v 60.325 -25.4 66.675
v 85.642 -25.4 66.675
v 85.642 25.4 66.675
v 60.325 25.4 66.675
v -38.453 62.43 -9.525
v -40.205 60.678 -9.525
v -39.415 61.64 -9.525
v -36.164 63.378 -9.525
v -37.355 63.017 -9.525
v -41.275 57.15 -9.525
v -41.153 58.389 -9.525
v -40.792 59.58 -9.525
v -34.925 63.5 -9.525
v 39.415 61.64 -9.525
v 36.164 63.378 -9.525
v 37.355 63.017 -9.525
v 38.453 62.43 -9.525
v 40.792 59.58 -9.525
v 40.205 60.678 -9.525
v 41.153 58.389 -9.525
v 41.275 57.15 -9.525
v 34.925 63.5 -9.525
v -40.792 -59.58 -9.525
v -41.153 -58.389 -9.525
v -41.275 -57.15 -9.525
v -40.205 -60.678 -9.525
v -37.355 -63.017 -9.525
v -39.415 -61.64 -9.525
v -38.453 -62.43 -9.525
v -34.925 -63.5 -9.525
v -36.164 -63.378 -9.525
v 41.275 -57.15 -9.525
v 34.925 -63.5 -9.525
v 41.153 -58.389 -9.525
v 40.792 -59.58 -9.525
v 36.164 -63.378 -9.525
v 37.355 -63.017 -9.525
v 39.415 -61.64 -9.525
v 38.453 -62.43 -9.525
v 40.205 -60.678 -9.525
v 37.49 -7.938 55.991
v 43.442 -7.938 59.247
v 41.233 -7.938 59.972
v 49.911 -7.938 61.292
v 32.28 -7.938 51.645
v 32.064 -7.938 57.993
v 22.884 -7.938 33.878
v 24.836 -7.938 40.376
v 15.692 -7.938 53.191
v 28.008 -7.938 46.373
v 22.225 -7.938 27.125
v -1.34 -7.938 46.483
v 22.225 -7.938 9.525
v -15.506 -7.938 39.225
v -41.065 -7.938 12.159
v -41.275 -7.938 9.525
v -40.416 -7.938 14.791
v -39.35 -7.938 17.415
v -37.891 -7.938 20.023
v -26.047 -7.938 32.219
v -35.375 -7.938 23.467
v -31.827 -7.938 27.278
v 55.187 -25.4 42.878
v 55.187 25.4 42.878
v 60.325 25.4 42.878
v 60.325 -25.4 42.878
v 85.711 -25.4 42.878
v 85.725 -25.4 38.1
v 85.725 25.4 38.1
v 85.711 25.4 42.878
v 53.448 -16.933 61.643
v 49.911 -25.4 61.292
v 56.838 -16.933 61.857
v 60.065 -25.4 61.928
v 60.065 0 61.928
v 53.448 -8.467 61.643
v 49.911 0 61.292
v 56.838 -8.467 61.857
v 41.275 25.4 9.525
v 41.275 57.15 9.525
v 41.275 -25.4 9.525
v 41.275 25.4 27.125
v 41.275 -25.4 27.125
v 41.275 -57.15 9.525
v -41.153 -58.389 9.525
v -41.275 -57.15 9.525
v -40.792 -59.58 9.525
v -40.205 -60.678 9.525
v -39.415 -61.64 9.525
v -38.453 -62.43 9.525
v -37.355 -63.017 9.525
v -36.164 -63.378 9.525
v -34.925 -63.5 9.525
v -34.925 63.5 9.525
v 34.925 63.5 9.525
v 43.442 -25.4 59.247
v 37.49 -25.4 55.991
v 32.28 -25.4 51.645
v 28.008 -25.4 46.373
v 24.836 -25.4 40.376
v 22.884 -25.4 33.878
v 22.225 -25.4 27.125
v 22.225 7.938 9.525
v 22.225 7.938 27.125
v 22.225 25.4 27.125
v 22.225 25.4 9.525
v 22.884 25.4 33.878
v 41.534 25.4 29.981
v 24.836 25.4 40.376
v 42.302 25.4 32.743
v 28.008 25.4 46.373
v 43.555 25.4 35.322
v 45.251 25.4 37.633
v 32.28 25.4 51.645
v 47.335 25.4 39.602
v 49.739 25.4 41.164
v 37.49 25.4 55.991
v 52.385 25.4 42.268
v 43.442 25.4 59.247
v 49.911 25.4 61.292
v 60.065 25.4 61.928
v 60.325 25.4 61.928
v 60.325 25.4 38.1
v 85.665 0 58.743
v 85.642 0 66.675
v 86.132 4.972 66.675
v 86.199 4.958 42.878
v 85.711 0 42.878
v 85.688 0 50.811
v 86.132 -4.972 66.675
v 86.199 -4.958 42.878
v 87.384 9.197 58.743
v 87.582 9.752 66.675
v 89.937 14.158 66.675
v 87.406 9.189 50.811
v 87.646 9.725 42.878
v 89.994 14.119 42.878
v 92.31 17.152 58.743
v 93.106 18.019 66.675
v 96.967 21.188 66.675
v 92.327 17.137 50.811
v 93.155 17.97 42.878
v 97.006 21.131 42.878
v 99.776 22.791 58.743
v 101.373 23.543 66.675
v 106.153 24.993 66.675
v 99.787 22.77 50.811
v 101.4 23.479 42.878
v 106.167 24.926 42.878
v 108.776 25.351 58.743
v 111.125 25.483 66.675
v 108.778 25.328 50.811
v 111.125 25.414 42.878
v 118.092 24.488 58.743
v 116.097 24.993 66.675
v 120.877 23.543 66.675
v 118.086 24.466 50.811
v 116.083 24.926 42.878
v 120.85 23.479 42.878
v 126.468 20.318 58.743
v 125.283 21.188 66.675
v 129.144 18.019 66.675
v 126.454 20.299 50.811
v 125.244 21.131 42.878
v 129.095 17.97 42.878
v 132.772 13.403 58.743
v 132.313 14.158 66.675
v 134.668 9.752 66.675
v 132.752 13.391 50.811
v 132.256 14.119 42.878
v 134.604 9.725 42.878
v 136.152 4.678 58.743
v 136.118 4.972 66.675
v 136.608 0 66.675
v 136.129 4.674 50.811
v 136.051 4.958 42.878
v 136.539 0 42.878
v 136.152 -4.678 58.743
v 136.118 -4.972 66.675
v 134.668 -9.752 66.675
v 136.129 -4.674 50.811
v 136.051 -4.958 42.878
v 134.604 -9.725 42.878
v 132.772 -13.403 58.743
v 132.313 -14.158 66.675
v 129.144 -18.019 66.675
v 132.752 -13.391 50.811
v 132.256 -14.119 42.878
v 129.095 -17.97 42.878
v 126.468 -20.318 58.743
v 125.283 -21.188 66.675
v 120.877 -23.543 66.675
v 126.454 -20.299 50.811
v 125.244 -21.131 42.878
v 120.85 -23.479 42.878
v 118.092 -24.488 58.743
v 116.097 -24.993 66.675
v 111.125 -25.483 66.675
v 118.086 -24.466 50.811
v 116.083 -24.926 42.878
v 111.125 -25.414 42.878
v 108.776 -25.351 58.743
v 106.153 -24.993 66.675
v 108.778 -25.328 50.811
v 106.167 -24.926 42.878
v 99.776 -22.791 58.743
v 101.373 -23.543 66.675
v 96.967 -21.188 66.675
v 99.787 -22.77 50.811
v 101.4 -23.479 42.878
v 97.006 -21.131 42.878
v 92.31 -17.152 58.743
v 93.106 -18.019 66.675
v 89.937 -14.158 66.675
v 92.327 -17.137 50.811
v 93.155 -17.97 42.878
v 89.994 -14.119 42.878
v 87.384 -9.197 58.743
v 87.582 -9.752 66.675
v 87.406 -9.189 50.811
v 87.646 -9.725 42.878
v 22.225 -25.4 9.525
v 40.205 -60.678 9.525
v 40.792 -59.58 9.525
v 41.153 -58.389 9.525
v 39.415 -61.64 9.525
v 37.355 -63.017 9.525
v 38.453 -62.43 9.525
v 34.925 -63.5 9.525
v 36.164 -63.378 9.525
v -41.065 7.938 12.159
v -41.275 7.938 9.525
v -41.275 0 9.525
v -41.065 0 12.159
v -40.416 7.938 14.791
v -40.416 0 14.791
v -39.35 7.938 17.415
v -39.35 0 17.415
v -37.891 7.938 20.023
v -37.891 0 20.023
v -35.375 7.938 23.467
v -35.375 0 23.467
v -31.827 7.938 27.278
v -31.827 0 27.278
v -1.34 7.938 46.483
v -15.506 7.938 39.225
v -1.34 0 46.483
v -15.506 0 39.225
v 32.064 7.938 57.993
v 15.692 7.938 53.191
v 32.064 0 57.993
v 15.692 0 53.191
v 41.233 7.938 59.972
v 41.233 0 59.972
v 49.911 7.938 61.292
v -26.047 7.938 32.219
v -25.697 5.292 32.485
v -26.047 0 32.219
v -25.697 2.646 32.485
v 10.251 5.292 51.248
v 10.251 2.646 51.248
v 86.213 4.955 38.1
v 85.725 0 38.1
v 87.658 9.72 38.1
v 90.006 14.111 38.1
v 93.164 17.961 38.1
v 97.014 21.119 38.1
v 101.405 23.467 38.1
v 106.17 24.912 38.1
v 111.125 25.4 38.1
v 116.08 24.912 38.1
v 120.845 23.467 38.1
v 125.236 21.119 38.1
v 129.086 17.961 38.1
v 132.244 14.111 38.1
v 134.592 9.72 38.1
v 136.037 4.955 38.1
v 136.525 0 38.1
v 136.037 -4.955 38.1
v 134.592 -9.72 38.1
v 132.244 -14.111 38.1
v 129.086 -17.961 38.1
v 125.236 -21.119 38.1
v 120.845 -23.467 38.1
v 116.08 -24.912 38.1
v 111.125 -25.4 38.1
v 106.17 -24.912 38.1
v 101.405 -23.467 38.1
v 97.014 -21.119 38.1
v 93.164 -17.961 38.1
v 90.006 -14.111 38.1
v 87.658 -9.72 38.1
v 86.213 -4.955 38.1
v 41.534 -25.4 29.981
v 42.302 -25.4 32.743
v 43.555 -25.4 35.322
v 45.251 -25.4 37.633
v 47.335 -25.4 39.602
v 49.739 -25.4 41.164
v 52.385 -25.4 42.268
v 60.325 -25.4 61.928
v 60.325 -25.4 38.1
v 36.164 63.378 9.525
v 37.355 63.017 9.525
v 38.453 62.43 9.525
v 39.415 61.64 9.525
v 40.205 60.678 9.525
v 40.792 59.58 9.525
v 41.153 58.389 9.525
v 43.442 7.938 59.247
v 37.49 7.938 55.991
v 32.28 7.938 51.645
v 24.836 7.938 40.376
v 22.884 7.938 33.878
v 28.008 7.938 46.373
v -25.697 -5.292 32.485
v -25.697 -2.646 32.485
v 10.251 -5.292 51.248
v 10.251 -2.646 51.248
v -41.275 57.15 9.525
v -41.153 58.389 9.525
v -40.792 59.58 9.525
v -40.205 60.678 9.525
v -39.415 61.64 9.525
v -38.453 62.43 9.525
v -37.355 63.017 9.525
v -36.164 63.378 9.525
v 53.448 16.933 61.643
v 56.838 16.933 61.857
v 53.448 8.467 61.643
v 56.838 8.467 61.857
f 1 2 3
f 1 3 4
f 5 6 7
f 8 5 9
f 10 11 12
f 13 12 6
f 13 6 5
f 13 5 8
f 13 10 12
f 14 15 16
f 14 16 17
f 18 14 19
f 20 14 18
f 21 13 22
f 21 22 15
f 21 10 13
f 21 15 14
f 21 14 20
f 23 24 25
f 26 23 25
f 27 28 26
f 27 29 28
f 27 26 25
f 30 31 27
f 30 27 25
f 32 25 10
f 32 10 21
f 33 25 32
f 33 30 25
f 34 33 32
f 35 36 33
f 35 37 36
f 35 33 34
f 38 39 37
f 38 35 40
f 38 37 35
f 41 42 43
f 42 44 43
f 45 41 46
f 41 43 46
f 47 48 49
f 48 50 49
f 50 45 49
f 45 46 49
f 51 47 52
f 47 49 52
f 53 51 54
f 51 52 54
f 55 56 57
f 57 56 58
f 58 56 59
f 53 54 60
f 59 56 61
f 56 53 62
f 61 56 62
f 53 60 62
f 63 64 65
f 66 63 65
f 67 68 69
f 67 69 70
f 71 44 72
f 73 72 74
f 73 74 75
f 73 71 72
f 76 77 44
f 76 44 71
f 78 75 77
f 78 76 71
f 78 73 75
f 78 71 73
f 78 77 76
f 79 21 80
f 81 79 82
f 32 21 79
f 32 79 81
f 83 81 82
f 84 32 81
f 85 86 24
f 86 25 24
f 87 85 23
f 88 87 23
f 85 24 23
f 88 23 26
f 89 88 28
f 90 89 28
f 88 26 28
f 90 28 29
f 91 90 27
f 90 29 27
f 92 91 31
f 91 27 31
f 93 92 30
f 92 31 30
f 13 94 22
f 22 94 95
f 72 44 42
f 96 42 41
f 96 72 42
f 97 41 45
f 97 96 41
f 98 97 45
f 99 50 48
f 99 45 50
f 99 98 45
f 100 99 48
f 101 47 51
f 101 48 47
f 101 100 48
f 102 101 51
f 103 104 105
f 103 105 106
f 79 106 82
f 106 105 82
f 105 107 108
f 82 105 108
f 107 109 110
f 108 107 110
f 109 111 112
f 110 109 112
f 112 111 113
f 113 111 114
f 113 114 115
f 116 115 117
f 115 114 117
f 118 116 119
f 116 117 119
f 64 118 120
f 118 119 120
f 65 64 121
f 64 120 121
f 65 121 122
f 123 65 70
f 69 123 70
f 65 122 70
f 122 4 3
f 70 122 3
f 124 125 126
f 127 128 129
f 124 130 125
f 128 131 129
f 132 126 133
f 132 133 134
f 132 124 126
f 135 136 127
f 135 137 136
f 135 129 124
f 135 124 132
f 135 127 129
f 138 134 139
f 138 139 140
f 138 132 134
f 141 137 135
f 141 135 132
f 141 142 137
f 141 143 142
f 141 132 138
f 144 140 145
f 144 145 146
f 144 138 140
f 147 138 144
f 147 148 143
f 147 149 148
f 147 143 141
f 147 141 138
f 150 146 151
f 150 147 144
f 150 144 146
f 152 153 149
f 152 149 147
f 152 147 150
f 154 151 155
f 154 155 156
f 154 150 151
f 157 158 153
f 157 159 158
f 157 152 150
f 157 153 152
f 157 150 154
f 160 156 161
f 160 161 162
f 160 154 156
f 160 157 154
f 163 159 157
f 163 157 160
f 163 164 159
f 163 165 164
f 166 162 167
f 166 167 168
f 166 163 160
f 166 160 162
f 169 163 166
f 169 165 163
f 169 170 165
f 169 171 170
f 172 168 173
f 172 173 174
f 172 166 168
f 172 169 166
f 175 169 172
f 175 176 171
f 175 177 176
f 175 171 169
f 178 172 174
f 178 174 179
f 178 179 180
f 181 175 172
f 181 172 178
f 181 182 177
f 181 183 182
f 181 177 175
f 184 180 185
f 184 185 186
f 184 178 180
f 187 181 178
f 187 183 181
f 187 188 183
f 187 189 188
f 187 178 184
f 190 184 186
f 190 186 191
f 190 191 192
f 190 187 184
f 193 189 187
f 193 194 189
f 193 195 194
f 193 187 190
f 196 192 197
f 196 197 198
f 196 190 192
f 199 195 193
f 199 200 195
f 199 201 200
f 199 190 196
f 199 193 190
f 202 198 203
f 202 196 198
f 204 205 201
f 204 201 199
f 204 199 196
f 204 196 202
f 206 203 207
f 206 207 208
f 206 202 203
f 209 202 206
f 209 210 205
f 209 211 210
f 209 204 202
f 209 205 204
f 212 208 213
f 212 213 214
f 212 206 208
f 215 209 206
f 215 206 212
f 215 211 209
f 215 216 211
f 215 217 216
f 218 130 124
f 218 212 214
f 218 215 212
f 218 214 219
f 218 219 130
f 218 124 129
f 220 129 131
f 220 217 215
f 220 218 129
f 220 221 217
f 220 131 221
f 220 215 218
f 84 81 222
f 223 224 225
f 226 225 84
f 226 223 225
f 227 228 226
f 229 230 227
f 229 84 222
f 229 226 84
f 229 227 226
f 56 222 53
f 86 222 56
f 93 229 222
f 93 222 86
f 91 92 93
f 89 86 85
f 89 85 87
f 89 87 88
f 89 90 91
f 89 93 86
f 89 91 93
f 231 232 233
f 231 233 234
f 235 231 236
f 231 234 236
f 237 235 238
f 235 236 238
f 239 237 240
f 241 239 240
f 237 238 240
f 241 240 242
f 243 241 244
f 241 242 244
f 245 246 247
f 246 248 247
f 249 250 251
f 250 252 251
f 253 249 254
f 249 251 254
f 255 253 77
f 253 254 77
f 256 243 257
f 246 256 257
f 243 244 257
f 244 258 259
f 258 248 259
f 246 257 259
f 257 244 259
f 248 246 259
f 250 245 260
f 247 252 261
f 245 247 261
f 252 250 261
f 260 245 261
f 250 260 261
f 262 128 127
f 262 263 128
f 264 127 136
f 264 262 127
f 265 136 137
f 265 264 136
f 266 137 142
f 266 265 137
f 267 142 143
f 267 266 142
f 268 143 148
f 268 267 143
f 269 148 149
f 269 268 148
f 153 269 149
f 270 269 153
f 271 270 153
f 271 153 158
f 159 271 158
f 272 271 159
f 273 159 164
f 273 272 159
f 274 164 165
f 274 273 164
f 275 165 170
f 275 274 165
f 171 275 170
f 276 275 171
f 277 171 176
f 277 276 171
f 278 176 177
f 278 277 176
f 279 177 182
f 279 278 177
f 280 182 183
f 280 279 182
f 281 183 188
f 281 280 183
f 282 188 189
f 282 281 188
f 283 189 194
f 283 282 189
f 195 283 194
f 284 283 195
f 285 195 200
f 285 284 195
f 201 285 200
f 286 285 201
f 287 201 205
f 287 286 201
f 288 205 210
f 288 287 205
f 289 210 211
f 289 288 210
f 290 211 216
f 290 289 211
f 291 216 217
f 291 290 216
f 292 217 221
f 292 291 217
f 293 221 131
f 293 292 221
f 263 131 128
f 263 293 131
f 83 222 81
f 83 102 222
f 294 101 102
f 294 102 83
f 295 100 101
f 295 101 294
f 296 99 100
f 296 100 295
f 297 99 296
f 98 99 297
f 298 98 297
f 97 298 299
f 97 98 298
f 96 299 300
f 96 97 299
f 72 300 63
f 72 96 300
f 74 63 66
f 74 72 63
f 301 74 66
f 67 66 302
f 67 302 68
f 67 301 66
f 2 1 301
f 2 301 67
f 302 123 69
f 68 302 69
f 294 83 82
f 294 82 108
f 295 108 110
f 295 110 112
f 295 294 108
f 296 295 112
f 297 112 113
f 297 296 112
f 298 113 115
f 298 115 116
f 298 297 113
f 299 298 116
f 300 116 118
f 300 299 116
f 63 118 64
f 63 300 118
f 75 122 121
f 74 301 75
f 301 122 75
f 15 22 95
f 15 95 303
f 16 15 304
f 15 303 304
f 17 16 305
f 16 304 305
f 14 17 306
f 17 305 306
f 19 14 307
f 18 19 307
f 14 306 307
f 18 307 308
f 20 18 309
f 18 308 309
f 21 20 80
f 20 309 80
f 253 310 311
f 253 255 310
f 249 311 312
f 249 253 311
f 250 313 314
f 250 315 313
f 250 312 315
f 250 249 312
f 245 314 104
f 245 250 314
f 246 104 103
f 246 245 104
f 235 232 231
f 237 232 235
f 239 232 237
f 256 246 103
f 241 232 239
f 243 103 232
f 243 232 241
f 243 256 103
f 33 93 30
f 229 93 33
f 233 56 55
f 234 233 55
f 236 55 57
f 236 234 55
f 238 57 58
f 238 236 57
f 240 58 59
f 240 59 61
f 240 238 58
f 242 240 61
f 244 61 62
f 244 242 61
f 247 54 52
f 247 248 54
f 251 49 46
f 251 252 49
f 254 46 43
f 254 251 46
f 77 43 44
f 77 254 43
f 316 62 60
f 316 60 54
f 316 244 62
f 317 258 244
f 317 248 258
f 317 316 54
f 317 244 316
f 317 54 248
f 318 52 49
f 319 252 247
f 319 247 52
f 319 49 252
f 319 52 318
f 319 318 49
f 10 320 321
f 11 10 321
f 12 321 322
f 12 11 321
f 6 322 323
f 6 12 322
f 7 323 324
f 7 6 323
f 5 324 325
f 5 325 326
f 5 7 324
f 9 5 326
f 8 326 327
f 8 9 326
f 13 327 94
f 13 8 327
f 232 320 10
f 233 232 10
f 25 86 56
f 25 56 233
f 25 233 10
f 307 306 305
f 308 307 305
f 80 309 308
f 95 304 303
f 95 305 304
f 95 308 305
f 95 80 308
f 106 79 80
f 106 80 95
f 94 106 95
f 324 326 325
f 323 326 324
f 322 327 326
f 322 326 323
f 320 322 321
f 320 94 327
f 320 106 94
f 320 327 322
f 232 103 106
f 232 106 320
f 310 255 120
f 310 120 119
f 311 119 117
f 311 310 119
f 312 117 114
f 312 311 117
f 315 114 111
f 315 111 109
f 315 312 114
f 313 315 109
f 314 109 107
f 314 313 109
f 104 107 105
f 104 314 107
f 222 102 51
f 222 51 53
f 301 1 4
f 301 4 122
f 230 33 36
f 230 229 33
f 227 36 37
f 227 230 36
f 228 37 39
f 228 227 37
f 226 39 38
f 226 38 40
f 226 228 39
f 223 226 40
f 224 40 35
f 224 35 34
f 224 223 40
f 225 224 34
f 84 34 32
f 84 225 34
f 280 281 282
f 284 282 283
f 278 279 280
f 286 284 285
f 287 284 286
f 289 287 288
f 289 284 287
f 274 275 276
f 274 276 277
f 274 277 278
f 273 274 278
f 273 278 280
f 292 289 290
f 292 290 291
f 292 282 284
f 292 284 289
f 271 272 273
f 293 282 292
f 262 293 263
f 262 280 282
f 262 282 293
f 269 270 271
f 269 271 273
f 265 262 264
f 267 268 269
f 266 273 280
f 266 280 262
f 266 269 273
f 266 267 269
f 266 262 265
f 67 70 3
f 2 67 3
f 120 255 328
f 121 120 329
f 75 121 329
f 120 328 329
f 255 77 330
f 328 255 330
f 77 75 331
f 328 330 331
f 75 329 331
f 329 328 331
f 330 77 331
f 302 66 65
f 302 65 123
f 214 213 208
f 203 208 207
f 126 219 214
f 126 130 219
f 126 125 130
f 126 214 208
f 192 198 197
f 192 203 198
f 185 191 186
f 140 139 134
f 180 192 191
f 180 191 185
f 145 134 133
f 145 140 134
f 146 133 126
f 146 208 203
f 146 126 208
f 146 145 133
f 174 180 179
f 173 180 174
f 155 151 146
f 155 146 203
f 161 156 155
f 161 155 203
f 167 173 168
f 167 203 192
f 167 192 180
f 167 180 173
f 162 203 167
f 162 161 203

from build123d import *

# Parameters (mm, degrees)
F1_DEPTH = 63.5
F2_DEPTH = 25.4
F3_DEPTH = 7.9375
F5_R     = 6.35


with BuildPart() as f1:
    # F0 (on Front) → F1 (new body, symmetric)
    with BuildSketch(Plane.XZ):
        Polygon((-41.275, 9.525), (-41.275, -9.525), (41.275, -9.525), (41.275, 9.525), (22.225, 9.525), align=None)
    extrude(amount=F1_DEPTH, both=True)

    # F0 (on Front) → F2 (join, symmetric)
    with BuildSketch(Plane.XZ):
        with BuildLine():
            Line((22.225, 9.525), (41.275, 9.525))
            Line((41.275, 9.525), (41.275, 27.125136))
            ThreePointArc((41.275, 27.125136), (45.250799, 37.633449), (55.186765, 42.878273))
            Line((55.186765, 42.878273), (60.325, 42.878273))
            Line((60.325, 42.878273), (60.325, 61.928273))
            Line((60.325, 61.928273), (60.065007, 61.928273))
            add(Edge.make_bspline(
                [(49.911332, 61.291747), (53.516179, 61.710333), (56.925903, 61.929341), (60.065007, 61.928273)],
                knots=[103.69328, 103.69328, 103.69328, 103.69328, 114.087248, 114.087248, 114.087248, 114.087248], degree=3))
            ThreePointArc((49.911332, 61.291747), (30.015464, 49.113146), (22.225, 27.125136))
            Line((22.225, 27.125136), (22.225, 9.525))
        make_face()
        Polygon((60.325, 66.675), (60.325, 61.928273), (60.325, 42.878273), (85.711101, 42.878273), (85.641883, 66.675), align=None)
        Polygon((85.711101, 42.878273), (60.325, 42.878273), (60.325, 38.1), (85.725, 38.1), align=None)
    extrude(amount=F2_DEPTH, both=True)

    # F0 (on Front) → F3 (join, symmetric)
    with BuildSketch(Plane.XZ):
        with BuildLine():
            add(Edge.make_bspline(
                [(-41.275, 9.525), (-41.434549, 33.076549), (13.94832, 57.115811), (49.911332, 61.291747)],
                knots=[0, 0, 0, 0, 103.69328, 103.69328, 103.69328, 103.69328], degree=3))
            Line((-41.275, 9.525), (22.225, 9.525))
            Line((22.225, 9.525), (22.225, 27.125136))
            ThreePointArc((22.225, 27.125136), (30.015464, 49.113146), (49.911332, 61.291747))
        make_face()
    extrude(amount=F3_DEPTH, both=True)

    # F5
    f5_edges = [f1.edges().sort_by_distance(p)[0] for p in [
        (41.275, -63.5, 0),
        (-41.275, -63.5, 0),
        (-41.275, 63.5, 0),
        (41.275, 63.5, 0),
    ]]
    fillet(f5_edges, radius=F5_R)


with BuildPart() as f4:
    # F0 (on Front) → F4 (revolve)
    with BuildSketch(Plane.XZ):
        Polygon((85.641883, 66.675), (85.711101, 42.878273), (85.725, 38.1), (111.125, 38.1), (111.125, 66.675), align=None)
    revolve(axis=Axis((111.125, 0, 52.3875), (0, 0, -1)))


solid = Compound([f1.part, f4.part])
